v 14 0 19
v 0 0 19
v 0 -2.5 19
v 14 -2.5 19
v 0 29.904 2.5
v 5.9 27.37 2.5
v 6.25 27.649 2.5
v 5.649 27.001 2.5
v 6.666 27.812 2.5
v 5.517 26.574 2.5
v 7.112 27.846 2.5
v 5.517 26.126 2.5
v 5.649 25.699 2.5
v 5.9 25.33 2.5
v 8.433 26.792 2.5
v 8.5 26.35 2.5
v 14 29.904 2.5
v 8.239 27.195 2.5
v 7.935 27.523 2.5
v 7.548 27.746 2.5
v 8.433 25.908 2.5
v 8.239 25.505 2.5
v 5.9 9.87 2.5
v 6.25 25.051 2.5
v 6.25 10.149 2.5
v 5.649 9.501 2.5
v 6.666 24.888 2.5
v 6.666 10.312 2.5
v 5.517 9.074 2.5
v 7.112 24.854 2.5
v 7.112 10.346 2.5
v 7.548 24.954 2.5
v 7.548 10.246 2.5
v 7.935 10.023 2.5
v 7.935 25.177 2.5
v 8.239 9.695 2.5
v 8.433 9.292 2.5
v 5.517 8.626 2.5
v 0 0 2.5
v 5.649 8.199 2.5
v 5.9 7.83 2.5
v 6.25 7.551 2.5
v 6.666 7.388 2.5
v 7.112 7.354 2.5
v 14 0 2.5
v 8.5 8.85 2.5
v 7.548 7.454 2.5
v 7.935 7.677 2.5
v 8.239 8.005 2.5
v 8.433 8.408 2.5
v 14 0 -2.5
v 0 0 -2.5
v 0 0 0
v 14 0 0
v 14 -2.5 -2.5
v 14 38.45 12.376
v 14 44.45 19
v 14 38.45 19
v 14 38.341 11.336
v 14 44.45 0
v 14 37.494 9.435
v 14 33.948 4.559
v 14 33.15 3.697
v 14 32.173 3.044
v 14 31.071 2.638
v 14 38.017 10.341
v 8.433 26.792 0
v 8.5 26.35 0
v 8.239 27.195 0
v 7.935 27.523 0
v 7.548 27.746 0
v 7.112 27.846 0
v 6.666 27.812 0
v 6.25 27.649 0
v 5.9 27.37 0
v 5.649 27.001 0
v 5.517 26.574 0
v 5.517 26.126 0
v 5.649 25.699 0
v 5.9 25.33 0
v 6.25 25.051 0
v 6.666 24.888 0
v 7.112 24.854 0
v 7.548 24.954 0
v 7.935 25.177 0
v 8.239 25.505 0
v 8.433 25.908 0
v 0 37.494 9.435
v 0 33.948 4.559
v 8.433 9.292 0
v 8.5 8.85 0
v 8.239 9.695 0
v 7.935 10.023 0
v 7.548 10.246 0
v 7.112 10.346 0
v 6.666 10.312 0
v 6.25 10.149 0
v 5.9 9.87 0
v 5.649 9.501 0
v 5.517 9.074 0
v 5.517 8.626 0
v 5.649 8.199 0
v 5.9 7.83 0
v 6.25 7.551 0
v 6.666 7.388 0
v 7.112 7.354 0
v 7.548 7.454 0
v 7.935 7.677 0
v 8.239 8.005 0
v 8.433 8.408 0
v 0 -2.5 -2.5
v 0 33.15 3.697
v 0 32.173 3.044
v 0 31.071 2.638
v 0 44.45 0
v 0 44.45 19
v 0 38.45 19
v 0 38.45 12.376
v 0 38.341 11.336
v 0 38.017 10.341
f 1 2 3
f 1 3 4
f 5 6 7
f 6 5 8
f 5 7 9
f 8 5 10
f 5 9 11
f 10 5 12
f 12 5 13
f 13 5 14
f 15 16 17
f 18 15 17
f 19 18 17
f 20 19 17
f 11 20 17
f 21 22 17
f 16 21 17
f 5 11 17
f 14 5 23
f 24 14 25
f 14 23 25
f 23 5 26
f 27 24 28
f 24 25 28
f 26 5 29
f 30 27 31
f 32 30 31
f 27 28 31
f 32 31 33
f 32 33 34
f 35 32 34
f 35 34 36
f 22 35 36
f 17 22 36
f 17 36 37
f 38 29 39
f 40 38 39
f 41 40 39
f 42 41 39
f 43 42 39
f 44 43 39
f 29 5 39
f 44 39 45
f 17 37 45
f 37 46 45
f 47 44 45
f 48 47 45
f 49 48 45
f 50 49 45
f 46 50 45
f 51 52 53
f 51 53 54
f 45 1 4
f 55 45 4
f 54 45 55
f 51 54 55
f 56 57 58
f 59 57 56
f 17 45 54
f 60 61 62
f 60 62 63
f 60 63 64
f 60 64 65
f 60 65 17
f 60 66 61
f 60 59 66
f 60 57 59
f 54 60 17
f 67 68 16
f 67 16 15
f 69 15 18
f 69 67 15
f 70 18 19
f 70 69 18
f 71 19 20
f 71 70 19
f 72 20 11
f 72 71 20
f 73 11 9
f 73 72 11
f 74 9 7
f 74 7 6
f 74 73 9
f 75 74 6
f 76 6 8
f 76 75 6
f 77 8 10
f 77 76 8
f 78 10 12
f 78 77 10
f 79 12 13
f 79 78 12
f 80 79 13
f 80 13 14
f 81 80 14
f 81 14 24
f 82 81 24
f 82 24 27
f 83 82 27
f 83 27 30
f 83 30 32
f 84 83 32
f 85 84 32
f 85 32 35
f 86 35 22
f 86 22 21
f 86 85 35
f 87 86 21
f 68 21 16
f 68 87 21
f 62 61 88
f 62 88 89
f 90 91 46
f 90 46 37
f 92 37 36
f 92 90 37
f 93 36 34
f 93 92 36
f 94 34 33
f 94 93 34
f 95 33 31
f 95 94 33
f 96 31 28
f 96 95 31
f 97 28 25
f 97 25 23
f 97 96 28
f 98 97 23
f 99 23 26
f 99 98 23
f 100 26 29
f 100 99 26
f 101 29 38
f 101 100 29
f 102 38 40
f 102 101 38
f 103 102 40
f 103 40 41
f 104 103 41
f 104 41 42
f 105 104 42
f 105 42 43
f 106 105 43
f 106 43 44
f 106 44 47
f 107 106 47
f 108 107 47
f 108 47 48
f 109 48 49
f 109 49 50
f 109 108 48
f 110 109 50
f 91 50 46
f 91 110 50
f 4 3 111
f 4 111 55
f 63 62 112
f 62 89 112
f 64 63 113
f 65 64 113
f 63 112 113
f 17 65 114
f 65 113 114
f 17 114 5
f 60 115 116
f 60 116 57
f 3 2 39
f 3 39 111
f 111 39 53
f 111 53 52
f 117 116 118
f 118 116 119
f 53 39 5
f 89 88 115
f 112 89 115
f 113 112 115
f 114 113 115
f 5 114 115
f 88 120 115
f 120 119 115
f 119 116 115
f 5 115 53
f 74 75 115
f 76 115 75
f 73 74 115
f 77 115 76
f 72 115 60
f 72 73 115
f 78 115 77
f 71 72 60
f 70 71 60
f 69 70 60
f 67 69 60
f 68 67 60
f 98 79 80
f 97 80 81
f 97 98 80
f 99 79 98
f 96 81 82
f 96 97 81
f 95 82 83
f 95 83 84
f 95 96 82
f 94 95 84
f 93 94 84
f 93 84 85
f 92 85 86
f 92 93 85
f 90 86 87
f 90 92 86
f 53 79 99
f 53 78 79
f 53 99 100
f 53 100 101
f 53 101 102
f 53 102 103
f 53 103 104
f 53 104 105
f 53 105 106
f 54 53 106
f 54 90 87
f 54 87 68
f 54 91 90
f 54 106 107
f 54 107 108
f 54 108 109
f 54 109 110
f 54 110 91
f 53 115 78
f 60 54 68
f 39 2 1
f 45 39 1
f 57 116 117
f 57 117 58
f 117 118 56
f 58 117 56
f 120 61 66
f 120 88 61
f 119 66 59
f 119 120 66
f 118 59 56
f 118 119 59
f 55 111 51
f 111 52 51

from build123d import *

# Parameters (mm, degrees)
SKETCH1_W                = 14
SKETCH1_H                = 28.85
SKETCH1_R                = 1.5
BOSS_EXTRUDE1_DEPTH      = 2.5
BOSS_EXTRUDE2_DEPTH      = 16.5
BOSS_EXTRUDE2_DEPTH_BACK = 5
SKETCH3_W                = 14
SKETCH3_H                = 2
SKETCH4_W                = 14
SKETCH4_H                = 2.5
BOSS_EXTRUDE3_DEPTH      = 15.6
SKETCH5_W                = 14
SKETCH5_H                = 2.5
BOSS_EXTRUDE4_DEPTH      = 21.5
SKETCH6_W                = 14
SKETCH6_H                = 6
BOSS_EXTRUDE5_DEPTH      = 16.5
BOSS_EXTRUDE6_DEPTH      = 14
FILLET2_R                = 5


with BuildPart() as part:
    # Sketch1 → Boss-Extrude1 (new body)
    with BuildSketch(Plane.XY):
        with Locations((7, 14.425)):
            Rectangle(SKETCH1_W, SKETCH1_H)
        with Locations((7, 26.35)):
            Circle(SKETCH1_R, mode=Mode.SUBTRACT)
        with Locations((7, 8.85)):
            Circle(SKETCH1_R, mode=Mode.SUBTRACT)
    extrude(amount=BOSS_EXTRUDE1_DEPTH)

    # Sketch3 → Boss-Extrude2 (add, two sides: drawn at the far end of the back side and taken through both)
    with BuildSketch(Plane.XY.offset(2.5).offset(-BOSS_EXTRUDE2_DEPTH_BACK)):
        with Locations((7, -1)):
            Rectangle(SKETCH3_W, SKETCH3_H)
    extrude(amount=BOSS_EXTRUDE2_DEPTH + BOSS_EXTRUDE2_DEPTH_BACK)

    # Sketch4 → Boss-Extrude3 (add)
    with BuildSketch(Plane(origin=(0, 28.85, 0), x_dir=(1, 0, 0), z_dir=(0, 1, 0))):
        with Locations((7, -1.25)):
            Rectangle(SKETCH4_W, SKETCH4_H)
    extrude(amount=BOSS_EXTRUDE3_DEPTH)

    # Sketch5 → Boss-Extrude4 (add)
    with BuildSketch(Plane.XY.offset(19)):
        with Locations((7, -1.25)):
            Rectangle(SKETCH5_W, SKETCH5_H)
    extrude(amount=-BOSS_EXTRUDE4_DEPTH)

    # Sketch6 → Boss-Extrude5 (add)
    with BuildSketch(Plane.XY.offset(2.5)):
        with Locations((7, 41.45)):
            Rectangle(SKETCH6_W, SKETCH6_H)
    extrude(amount=BOSS_EXTRUDE5_DEPTH)

    # Sketch7 → Boss-Extrude6 (add)
    with BuildSketch(Plane(origin=(14, 0, 0), x_dir=(0, 0, -1), z_dir=(1, 0, 0))):
        Polygon((-10.75, 38.45), (-2.5, 32.45), (-2.5, 38.45), align=None)
    extrude(amount=-BOSS_EXTRUDE6_DEPTH)

    # Fillet2
    fillet2_edges = [part.edges().sort_by_distance(p)[0] for p in [
        (7, 38.45, 10.75),
        (7, 32.45, 2.5),
    ]]
    fillet(fillet2_edges, radius=FILLET2_R)


solid = part.part
